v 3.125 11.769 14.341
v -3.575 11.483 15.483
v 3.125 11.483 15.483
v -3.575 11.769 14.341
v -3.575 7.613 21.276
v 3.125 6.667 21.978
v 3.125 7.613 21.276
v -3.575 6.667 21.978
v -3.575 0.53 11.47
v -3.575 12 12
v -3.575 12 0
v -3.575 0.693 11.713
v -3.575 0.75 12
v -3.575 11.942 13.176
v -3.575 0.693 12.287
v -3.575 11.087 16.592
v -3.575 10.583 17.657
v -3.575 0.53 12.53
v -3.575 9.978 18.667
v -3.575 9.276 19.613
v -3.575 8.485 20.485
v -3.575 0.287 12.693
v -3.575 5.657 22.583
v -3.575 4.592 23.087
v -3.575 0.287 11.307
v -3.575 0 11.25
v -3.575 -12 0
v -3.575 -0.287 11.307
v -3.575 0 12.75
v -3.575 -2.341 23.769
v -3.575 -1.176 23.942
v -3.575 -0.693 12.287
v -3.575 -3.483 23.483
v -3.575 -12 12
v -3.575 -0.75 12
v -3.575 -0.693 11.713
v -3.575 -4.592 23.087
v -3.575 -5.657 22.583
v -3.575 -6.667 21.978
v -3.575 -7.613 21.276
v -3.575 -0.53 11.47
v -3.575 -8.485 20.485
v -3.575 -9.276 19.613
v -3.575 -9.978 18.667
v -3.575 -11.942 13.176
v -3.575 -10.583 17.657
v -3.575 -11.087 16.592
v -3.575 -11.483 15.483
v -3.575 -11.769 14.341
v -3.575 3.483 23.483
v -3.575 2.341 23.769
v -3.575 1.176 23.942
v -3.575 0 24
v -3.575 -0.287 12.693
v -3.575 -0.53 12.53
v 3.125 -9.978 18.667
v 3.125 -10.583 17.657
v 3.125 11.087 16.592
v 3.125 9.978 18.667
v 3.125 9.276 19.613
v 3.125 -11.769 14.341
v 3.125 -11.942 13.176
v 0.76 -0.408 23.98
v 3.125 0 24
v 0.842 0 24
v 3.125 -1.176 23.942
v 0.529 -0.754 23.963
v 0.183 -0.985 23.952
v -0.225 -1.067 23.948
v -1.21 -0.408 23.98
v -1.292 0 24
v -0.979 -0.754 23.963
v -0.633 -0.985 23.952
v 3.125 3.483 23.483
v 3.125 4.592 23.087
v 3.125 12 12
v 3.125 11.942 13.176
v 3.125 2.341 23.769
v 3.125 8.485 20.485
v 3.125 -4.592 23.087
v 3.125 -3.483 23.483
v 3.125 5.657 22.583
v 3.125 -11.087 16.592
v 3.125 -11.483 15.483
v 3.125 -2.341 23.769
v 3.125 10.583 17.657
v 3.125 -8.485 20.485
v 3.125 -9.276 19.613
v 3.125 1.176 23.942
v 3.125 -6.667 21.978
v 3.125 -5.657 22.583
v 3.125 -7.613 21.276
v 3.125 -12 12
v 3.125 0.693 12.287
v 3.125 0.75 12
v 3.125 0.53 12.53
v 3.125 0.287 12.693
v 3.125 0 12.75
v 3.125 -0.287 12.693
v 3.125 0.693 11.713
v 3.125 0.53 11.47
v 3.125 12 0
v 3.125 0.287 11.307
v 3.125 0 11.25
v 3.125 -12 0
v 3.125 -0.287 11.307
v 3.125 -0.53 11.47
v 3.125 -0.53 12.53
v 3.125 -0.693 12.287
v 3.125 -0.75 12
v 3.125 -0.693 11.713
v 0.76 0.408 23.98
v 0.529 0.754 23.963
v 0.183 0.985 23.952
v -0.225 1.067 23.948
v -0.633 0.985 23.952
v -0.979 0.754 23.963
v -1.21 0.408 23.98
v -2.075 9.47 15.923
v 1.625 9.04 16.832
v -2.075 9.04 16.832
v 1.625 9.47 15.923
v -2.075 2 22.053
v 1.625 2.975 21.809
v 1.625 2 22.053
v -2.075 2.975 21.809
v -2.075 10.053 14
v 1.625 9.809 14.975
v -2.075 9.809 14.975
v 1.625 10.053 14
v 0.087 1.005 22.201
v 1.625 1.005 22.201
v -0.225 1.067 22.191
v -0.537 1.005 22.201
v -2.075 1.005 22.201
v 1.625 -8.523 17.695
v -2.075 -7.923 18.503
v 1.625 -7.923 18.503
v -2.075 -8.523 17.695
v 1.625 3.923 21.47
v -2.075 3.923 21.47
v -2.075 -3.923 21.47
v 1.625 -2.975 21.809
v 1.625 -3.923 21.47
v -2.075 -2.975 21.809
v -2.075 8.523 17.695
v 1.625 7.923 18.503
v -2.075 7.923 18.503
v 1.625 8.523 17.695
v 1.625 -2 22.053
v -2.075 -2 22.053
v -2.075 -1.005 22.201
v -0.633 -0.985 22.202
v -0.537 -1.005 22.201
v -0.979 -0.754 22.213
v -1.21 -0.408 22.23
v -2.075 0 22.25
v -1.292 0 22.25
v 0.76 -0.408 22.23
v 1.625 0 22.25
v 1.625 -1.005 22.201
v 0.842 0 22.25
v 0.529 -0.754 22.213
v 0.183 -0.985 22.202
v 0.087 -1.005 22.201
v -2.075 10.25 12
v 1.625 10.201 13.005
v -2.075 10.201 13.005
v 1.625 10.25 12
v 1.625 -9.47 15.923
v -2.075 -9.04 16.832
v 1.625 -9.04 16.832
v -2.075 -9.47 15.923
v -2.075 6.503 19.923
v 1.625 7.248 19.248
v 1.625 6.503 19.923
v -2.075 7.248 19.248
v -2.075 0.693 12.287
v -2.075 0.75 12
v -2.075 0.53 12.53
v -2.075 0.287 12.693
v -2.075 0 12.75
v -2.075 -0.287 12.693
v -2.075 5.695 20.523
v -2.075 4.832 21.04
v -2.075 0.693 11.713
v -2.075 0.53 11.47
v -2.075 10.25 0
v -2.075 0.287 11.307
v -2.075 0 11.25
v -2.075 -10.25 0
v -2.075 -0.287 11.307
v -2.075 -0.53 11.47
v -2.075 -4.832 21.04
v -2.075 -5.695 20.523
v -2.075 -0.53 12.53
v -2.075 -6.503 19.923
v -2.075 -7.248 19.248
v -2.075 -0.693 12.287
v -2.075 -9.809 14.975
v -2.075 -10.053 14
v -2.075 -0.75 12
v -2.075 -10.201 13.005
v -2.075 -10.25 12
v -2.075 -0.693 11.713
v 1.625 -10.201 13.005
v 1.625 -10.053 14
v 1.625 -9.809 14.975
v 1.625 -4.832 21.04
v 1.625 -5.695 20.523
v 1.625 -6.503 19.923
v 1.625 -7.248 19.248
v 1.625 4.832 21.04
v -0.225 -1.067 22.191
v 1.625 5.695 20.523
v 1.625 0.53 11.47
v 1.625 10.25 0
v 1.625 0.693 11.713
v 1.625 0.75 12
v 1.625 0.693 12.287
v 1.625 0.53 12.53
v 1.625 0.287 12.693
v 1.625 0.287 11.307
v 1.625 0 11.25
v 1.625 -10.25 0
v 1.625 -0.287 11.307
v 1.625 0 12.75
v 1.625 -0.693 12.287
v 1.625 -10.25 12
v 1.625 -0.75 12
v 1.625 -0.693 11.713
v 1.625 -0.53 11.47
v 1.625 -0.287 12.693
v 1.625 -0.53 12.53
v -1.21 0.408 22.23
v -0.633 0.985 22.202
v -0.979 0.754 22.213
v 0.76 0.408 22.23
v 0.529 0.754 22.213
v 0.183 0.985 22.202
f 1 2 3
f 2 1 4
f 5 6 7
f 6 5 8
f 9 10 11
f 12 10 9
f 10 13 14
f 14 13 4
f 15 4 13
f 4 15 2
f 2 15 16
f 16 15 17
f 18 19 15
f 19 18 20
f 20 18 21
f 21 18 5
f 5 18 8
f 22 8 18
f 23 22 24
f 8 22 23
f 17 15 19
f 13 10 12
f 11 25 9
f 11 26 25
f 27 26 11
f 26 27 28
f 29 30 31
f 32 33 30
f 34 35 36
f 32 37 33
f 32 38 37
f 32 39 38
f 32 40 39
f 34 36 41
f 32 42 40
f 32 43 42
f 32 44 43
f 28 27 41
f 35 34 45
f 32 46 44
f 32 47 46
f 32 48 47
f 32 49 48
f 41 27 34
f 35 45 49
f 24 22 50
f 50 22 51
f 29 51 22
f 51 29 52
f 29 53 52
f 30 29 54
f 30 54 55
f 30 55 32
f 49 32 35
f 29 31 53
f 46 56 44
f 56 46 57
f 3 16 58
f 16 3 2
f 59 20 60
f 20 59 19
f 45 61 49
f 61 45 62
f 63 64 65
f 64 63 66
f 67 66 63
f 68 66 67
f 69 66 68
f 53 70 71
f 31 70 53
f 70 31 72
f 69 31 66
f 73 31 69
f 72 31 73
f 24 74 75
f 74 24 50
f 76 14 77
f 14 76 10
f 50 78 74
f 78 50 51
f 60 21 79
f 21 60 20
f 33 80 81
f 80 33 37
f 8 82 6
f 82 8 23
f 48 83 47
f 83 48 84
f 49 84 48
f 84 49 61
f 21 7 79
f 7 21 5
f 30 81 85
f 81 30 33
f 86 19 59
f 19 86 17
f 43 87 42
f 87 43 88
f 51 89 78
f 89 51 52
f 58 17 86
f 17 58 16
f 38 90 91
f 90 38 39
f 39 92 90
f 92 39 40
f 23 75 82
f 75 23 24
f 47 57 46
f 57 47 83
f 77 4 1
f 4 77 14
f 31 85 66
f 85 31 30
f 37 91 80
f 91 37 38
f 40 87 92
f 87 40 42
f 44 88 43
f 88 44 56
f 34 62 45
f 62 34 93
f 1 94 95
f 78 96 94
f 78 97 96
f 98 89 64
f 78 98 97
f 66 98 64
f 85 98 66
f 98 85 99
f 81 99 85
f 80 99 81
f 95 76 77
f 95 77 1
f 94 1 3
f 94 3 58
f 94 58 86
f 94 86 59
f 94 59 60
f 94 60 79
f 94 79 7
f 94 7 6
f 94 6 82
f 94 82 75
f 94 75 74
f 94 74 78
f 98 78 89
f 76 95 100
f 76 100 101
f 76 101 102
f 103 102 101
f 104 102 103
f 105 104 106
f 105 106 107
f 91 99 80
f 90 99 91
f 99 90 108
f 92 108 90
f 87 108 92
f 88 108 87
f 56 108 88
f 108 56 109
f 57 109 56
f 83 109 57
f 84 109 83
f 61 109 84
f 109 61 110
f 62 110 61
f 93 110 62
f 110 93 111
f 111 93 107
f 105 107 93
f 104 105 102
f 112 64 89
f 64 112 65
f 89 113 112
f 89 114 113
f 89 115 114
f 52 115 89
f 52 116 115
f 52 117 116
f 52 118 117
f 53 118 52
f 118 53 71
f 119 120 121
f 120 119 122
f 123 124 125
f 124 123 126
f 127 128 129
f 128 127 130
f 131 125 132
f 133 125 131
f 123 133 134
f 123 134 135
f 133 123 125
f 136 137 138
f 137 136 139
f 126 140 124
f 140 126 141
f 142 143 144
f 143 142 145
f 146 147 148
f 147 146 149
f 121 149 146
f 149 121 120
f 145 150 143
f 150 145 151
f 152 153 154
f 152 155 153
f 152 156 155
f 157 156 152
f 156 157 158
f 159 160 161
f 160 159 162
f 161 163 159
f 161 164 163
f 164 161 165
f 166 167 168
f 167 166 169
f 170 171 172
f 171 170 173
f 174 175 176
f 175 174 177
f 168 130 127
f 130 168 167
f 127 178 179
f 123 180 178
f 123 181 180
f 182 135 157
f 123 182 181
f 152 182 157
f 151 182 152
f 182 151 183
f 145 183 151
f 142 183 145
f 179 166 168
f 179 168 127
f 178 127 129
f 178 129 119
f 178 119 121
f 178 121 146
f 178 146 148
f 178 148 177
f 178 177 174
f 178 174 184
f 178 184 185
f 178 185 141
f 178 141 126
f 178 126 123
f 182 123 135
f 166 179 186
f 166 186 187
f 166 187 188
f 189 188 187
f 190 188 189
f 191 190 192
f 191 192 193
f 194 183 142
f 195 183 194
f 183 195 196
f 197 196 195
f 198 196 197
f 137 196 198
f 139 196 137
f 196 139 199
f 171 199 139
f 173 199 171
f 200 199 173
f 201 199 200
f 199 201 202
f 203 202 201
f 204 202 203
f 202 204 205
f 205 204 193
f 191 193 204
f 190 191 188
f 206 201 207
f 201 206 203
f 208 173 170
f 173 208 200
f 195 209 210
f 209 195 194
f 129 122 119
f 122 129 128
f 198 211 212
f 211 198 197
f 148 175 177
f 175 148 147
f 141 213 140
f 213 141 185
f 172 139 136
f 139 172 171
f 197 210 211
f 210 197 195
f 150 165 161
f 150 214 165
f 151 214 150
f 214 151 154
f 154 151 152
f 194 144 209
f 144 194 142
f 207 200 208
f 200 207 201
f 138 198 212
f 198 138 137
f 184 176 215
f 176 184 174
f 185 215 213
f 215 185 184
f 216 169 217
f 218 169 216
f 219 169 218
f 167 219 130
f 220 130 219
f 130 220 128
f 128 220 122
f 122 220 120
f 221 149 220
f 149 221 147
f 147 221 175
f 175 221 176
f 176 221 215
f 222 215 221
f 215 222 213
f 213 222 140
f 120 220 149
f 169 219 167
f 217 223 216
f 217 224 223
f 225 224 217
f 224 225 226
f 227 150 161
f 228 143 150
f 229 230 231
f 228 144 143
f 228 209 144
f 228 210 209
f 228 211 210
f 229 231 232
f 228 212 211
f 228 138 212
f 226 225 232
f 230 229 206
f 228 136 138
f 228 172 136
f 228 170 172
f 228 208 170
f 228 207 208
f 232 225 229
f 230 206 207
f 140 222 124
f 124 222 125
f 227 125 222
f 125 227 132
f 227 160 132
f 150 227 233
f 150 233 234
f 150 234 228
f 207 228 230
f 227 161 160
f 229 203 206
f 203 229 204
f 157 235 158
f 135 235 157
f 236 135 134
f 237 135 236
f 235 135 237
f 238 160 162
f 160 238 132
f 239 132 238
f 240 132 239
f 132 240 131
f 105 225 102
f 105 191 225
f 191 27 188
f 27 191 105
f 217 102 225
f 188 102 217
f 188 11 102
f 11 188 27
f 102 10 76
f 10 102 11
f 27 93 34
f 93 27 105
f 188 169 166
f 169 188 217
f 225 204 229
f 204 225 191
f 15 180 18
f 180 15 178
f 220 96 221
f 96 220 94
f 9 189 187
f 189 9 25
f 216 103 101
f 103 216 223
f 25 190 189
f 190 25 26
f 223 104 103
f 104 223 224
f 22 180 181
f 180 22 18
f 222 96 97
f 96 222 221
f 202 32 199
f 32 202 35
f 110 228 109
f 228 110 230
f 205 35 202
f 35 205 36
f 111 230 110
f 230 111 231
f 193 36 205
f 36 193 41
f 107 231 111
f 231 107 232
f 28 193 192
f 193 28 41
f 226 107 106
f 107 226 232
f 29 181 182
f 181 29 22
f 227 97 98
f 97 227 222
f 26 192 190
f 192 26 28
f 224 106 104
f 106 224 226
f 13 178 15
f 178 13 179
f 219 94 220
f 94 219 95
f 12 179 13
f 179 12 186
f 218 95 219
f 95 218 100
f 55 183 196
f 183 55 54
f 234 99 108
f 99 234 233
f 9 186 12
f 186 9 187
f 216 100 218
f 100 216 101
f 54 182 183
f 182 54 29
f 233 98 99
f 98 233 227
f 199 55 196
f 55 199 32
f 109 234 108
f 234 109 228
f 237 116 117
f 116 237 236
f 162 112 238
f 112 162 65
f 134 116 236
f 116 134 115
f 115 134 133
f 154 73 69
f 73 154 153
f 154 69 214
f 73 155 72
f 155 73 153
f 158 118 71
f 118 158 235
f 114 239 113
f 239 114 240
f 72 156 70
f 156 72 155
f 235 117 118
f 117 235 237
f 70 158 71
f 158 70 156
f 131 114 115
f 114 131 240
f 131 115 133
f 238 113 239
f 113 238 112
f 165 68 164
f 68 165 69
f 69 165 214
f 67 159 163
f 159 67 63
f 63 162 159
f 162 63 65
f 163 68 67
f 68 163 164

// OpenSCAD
// [FL_INDEX: keywords="openscad, 3d_parametric, Parametric_button_cell_holder_version_2, csg_solid" | COT="Parametric OpenSCAD design from 3DCodeverse"]
// Title: Parametric button cell holder version 2

/*Battery dimensions in mm
CR1225 cell holder: 
 diameter=12mm 
 height=2.5mm 
 tolerance=0.5mm 
 wall thickness=2mm 

CR2032 cell holder: 
 diameter=20mm 
 height=3.2mm 
 tolerance=0.5mm 
 wall thickness=2mm 
*/

battery_diameter	=20.0;	// Diameter of battery
battery_height		=3.2;	// Thickness of battery
tolerance			=0.5;	// Make things a little looser
wall_thickness		=1.5;	// Wall thickness
wire_diameter		=1.5;	// Thickness of wire openings
extra_length		=2.0;	// Extends the open outwards to "hide" the battery a little bit
number_of_cells	=1;		// How many cells will be stacked

rotate([0,90,0])
{
	// Move to propper hieght and orientation
	translate([-battery_diameter/2-extra_length,0,-(battery_height*number_of_cells)-(wall_thickness/4)])
	{
		difference()
		{
			union()
			{
				difference()
				{
					// Main block
					cylinder(r=(battery_diameter/2)+tolerance+wall_thickness, h=battery_height*number_of_cells+(tolerance)+(2*wall_thickness),$fn=64);
					// Battery shape
					translate([0,0,wall_thickness])
						cylinder(r=(battery_diameter/2)+(tolerance/2), h=battery_height*number_of_cells+tolerance,$fn=64);
					// Square opening 
					translate([0,-((battery_diameter/2)+2+tolerance),0])
						cube([battery_diameter+10,battery_diameter*number_of_cells+5,battery_height*number_of_cells+5]);
				}
				difference()
				{
					// Square extension
					translate([0,-((battery_diameter/2)+wall_thickness+tolerance),0])
						cube([battery_diameter/2+extra_length,battery_diameter+(2*wall_thickness)+(2*tolerance),battery_height*number_of_cells+(2*wall_thickness)+tolerance]);
					// Square hole in end
					translate([0,-((battery_diameter/2))-(tolerance/2),wall_thickness])
						cube([battery_diameter+tolerance,battery_diameter+tolerance,battery_height*number_of_cells+tolerance]);
				}
			}
			// Wire holes
			translate([0,0,-1])
				cylinder(r=wire_diameter/2, h=battery_height*number_of_cells+tolerance+10,$fn=16);
			// Battery "push out" hole
			translate([-battery_diameter/2-wall_thickness-1,0,wall_thickness+(battery_height*number_of_cells/2)+tolerance/2])
				rotate([0,90,0])
					cylinder(r=battery_height/3,h=wall_thickness+1,$fn=16);
		}
	}
}
